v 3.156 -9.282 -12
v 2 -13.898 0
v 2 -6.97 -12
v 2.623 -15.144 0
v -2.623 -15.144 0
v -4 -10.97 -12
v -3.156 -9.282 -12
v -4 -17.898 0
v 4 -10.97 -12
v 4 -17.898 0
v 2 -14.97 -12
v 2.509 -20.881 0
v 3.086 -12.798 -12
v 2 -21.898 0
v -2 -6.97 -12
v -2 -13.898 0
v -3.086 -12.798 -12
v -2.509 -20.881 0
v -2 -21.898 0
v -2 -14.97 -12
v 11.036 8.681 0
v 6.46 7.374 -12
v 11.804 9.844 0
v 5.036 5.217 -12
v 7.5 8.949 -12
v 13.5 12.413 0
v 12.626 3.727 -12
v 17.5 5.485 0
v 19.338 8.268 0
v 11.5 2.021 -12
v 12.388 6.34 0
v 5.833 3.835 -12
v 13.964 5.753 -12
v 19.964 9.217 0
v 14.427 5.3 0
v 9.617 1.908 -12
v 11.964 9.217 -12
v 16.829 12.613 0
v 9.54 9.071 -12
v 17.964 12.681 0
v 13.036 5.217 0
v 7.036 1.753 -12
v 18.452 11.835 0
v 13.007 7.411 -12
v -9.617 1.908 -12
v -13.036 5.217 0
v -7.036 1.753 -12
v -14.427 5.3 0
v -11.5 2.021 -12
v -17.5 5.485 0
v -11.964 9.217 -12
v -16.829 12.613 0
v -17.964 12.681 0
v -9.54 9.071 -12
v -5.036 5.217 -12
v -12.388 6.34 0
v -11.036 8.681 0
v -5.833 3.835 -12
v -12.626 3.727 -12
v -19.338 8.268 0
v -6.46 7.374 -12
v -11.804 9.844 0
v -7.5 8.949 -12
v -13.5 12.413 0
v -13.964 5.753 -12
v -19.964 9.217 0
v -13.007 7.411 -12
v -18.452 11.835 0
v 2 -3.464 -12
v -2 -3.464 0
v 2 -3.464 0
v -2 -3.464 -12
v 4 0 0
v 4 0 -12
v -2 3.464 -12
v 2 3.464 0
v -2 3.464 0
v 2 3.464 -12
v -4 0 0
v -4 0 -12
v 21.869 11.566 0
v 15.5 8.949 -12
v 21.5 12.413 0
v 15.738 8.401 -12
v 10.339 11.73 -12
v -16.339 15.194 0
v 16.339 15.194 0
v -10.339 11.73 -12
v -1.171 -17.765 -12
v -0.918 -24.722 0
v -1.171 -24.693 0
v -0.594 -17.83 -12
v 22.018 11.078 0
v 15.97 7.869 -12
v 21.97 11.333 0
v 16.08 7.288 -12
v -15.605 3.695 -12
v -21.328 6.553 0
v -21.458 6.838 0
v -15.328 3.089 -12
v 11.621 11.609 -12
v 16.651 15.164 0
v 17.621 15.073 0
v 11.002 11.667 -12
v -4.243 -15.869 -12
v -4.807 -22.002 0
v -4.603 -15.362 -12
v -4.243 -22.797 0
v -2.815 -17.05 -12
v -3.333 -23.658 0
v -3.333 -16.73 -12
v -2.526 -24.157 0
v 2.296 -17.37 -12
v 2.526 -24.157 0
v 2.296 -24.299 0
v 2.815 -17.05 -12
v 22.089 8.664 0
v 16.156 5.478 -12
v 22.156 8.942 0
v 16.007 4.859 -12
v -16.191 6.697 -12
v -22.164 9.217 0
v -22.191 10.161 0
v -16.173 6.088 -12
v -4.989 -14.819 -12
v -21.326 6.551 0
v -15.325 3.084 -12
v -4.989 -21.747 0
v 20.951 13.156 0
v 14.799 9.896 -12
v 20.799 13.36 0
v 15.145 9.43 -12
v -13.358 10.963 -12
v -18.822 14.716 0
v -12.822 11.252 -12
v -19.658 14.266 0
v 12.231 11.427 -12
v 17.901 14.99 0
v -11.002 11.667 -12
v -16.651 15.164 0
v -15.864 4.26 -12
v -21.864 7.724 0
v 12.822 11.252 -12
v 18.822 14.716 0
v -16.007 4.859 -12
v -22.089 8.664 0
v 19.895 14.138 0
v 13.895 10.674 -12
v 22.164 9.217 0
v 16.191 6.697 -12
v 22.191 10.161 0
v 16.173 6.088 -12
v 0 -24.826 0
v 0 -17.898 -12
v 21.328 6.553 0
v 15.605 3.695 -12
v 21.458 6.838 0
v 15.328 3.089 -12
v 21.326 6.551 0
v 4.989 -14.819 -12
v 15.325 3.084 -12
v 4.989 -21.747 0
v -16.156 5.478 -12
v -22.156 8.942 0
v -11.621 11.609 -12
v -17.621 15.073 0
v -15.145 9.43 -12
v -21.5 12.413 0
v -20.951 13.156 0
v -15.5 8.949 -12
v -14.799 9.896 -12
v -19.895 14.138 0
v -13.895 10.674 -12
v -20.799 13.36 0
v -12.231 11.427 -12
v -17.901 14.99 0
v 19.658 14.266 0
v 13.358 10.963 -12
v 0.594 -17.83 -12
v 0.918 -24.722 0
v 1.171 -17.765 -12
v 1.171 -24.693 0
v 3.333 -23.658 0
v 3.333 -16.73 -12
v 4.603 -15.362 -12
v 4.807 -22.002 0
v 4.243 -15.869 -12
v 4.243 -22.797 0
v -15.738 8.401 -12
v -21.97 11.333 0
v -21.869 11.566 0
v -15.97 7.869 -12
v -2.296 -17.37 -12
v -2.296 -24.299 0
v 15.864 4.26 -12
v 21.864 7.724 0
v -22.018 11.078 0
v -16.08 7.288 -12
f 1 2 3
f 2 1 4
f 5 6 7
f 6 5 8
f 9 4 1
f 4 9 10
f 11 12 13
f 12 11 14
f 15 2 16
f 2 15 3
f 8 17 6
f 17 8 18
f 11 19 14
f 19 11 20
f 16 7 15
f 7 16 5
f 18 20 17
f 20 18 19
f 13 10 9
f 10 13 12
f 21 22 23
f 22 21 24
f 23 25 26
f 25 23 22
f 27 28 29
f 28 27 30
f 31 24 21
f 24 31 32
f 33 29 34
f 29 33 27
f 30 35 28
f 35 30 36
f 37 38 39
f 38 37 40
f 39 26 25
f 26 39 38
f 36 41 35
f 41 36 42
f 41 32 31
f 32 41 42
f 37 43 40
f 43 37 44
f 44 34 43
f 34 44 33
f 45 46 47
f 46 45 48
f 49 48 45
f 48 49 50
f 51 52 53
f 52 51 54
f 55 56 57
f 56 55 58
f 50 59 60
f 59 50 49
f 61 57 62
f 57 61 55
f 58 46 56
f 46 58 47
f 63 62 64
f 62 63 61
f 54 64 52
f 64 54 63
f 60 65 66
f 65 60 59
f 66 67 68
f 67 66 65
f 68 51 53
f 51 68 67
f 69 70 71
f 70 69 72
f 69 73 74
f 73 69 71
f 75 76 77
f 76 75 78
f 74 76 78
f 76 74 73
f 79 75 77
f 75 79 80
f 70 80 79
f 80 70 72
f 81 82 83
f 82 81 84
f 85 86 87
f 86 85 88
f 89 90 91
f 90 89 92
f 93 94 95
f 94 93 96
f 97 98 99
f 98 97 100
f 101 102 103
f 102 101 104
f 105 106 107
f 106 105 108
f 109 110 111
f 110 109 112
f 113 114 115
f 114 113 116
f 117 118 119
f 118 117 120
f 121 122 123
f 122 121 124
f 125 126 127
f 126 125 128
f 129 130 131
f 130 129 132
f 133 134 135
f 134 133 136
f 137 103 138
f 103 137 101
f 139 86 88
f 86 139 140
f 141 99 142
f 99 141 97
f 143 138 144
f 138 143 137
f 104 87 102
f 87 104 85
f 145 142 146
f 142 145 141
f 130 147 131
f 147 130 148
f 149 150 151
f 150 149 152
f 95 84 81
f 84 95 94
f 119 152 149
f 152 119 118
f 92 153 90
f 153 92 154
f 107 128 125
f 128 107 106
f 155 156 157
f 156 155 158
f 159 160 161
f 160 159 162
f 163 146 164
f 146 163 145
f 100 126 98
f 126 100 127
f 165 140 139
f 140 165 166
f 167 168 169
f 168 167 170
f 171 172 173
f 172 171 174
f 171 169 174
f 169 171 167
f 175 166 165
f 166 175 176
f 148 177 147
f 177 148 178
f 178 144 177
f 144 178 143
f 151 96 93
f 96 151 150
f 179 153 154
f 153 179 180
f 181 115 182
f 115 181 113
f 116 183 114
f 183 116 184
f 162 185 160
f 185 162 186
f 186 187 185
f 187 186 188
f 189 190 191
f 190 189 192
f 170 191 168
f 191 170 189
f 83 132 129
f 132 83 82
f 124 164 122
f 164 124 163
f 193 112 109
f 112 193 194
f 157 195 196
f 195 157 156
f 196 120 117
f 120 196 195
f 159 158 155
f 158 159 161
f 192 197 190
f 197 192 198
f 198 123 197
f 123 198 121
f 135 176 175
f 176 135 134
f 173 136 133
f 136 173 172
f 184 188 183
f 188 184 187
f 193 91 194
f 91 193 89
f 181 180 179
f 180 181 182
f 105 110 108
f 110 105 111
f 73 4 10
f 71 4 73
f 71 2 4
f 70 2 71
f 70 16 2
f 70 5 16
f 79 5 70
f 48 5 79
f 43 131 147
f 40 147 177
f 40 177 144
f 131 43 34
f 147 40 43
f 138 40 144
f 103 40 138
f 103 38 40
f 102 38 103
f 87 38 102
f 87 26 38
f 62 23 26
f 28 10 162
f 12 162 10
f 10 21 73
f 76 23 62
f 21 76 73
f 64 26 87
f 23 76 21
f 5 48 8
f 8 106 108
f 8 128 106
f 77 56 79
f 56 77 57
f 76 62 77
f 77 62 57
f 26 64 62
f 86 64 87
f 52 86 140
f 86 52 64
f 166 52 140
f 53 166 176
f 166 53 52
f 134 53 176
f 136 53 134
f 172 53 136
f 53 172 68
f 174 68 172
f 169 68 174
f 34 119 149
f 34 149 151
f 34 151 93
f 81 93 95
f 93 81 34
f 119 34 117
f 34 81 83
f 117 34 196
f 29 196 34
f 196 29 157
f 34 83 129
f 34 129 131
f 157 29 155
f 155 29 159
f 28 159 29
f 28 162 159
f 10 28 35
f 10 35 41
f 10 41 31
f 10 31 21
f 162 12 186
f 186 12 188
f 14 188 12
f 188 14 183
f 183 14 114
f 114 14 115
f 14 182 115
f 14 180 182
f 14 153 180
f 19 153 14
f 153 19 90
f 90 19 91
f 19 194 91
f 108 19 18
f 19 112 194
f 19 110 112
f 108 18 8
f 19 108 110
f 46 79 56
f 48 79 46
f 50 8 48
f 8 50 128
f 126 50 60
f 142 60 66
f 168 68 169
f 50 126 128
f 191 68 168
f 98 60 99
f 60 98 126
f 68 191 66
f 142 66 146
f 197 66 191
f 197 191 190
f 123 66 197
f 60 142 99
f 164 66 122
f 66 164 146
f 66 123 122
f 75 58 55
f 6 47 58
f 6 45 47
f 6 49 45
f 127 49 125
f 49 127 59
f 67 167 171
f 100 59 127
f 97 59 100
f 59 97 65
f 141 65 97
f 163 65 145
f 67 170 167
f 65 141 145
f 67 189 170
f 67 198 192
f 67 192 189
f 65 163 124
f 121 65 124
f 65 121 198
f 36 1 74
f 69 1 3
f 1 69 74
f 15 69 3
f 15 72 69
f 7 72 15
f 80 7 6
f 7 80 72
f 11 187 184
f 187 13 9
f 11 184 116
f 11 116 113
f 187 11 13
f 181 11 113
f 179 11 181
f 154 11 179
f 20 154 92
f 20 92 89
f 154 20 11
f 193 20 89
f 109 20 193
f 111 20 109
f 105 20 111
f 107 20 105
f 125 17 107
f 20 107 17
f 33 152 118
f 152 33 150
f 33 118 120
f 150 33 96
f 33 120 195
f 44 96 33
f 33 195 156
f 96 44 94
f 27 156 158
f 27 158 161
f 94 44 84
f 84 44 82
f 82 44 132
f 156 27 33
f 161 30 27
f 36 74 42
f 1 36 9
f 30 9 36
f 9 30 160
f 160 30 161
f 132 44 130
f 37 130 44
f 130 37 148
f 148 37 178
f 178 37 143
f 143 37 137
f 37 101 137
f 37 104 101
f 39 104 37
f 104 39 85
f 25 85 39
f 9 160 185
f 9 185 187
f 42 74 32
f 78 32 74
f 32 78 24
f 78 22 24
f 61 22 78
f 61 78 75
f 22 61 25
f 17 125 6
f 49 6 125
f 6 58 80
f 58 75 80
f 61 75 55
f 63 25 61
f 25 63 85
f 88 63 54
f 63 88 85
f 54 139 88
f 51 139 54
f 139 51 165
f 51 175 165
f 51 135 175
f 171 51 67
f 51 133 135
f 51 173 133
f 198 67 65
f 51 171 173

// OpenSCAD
an=30;
translate([0,0,-31])
intersection()
{
difference()
{
hull()
{
rotate(a=0, v=[0,0,1]) rotate(a=an, v=[1,0,0]) cylinder(h=50, d=12, $fn=32);
rotate(a=120, v=[0,0,1]) rotate(a=an, v=[1,0,0]) cylinder(h=50, d=12, $fn=32);
rotate(a=240, v=[0,0,1]) rotate(a=an, v=[1,0,0]) cylinder(h=50, d=12, $fn=32);
}
union()
{
rotate(a=0, v=[0,0,1]) rotate(a=an, v=[1,0,0]) cylinder(h=50, d=8, $fn=6);
rotate(a=120, v=[0,0,1]) rotate(a=an, v=[1,0,0]) cylinder(h=50, d=8, $fn=6);
rotate(a=240, v=[0,0,1]) rotate(a=an, v=[1,0,0]) cylinder(h=50, d=8, $fn=6);
cylinder(h=100, d=8, $fn=6, center=true);
}
}

translate([0,0,25]) cube(size=[100, 100, 12], center=true);
}
